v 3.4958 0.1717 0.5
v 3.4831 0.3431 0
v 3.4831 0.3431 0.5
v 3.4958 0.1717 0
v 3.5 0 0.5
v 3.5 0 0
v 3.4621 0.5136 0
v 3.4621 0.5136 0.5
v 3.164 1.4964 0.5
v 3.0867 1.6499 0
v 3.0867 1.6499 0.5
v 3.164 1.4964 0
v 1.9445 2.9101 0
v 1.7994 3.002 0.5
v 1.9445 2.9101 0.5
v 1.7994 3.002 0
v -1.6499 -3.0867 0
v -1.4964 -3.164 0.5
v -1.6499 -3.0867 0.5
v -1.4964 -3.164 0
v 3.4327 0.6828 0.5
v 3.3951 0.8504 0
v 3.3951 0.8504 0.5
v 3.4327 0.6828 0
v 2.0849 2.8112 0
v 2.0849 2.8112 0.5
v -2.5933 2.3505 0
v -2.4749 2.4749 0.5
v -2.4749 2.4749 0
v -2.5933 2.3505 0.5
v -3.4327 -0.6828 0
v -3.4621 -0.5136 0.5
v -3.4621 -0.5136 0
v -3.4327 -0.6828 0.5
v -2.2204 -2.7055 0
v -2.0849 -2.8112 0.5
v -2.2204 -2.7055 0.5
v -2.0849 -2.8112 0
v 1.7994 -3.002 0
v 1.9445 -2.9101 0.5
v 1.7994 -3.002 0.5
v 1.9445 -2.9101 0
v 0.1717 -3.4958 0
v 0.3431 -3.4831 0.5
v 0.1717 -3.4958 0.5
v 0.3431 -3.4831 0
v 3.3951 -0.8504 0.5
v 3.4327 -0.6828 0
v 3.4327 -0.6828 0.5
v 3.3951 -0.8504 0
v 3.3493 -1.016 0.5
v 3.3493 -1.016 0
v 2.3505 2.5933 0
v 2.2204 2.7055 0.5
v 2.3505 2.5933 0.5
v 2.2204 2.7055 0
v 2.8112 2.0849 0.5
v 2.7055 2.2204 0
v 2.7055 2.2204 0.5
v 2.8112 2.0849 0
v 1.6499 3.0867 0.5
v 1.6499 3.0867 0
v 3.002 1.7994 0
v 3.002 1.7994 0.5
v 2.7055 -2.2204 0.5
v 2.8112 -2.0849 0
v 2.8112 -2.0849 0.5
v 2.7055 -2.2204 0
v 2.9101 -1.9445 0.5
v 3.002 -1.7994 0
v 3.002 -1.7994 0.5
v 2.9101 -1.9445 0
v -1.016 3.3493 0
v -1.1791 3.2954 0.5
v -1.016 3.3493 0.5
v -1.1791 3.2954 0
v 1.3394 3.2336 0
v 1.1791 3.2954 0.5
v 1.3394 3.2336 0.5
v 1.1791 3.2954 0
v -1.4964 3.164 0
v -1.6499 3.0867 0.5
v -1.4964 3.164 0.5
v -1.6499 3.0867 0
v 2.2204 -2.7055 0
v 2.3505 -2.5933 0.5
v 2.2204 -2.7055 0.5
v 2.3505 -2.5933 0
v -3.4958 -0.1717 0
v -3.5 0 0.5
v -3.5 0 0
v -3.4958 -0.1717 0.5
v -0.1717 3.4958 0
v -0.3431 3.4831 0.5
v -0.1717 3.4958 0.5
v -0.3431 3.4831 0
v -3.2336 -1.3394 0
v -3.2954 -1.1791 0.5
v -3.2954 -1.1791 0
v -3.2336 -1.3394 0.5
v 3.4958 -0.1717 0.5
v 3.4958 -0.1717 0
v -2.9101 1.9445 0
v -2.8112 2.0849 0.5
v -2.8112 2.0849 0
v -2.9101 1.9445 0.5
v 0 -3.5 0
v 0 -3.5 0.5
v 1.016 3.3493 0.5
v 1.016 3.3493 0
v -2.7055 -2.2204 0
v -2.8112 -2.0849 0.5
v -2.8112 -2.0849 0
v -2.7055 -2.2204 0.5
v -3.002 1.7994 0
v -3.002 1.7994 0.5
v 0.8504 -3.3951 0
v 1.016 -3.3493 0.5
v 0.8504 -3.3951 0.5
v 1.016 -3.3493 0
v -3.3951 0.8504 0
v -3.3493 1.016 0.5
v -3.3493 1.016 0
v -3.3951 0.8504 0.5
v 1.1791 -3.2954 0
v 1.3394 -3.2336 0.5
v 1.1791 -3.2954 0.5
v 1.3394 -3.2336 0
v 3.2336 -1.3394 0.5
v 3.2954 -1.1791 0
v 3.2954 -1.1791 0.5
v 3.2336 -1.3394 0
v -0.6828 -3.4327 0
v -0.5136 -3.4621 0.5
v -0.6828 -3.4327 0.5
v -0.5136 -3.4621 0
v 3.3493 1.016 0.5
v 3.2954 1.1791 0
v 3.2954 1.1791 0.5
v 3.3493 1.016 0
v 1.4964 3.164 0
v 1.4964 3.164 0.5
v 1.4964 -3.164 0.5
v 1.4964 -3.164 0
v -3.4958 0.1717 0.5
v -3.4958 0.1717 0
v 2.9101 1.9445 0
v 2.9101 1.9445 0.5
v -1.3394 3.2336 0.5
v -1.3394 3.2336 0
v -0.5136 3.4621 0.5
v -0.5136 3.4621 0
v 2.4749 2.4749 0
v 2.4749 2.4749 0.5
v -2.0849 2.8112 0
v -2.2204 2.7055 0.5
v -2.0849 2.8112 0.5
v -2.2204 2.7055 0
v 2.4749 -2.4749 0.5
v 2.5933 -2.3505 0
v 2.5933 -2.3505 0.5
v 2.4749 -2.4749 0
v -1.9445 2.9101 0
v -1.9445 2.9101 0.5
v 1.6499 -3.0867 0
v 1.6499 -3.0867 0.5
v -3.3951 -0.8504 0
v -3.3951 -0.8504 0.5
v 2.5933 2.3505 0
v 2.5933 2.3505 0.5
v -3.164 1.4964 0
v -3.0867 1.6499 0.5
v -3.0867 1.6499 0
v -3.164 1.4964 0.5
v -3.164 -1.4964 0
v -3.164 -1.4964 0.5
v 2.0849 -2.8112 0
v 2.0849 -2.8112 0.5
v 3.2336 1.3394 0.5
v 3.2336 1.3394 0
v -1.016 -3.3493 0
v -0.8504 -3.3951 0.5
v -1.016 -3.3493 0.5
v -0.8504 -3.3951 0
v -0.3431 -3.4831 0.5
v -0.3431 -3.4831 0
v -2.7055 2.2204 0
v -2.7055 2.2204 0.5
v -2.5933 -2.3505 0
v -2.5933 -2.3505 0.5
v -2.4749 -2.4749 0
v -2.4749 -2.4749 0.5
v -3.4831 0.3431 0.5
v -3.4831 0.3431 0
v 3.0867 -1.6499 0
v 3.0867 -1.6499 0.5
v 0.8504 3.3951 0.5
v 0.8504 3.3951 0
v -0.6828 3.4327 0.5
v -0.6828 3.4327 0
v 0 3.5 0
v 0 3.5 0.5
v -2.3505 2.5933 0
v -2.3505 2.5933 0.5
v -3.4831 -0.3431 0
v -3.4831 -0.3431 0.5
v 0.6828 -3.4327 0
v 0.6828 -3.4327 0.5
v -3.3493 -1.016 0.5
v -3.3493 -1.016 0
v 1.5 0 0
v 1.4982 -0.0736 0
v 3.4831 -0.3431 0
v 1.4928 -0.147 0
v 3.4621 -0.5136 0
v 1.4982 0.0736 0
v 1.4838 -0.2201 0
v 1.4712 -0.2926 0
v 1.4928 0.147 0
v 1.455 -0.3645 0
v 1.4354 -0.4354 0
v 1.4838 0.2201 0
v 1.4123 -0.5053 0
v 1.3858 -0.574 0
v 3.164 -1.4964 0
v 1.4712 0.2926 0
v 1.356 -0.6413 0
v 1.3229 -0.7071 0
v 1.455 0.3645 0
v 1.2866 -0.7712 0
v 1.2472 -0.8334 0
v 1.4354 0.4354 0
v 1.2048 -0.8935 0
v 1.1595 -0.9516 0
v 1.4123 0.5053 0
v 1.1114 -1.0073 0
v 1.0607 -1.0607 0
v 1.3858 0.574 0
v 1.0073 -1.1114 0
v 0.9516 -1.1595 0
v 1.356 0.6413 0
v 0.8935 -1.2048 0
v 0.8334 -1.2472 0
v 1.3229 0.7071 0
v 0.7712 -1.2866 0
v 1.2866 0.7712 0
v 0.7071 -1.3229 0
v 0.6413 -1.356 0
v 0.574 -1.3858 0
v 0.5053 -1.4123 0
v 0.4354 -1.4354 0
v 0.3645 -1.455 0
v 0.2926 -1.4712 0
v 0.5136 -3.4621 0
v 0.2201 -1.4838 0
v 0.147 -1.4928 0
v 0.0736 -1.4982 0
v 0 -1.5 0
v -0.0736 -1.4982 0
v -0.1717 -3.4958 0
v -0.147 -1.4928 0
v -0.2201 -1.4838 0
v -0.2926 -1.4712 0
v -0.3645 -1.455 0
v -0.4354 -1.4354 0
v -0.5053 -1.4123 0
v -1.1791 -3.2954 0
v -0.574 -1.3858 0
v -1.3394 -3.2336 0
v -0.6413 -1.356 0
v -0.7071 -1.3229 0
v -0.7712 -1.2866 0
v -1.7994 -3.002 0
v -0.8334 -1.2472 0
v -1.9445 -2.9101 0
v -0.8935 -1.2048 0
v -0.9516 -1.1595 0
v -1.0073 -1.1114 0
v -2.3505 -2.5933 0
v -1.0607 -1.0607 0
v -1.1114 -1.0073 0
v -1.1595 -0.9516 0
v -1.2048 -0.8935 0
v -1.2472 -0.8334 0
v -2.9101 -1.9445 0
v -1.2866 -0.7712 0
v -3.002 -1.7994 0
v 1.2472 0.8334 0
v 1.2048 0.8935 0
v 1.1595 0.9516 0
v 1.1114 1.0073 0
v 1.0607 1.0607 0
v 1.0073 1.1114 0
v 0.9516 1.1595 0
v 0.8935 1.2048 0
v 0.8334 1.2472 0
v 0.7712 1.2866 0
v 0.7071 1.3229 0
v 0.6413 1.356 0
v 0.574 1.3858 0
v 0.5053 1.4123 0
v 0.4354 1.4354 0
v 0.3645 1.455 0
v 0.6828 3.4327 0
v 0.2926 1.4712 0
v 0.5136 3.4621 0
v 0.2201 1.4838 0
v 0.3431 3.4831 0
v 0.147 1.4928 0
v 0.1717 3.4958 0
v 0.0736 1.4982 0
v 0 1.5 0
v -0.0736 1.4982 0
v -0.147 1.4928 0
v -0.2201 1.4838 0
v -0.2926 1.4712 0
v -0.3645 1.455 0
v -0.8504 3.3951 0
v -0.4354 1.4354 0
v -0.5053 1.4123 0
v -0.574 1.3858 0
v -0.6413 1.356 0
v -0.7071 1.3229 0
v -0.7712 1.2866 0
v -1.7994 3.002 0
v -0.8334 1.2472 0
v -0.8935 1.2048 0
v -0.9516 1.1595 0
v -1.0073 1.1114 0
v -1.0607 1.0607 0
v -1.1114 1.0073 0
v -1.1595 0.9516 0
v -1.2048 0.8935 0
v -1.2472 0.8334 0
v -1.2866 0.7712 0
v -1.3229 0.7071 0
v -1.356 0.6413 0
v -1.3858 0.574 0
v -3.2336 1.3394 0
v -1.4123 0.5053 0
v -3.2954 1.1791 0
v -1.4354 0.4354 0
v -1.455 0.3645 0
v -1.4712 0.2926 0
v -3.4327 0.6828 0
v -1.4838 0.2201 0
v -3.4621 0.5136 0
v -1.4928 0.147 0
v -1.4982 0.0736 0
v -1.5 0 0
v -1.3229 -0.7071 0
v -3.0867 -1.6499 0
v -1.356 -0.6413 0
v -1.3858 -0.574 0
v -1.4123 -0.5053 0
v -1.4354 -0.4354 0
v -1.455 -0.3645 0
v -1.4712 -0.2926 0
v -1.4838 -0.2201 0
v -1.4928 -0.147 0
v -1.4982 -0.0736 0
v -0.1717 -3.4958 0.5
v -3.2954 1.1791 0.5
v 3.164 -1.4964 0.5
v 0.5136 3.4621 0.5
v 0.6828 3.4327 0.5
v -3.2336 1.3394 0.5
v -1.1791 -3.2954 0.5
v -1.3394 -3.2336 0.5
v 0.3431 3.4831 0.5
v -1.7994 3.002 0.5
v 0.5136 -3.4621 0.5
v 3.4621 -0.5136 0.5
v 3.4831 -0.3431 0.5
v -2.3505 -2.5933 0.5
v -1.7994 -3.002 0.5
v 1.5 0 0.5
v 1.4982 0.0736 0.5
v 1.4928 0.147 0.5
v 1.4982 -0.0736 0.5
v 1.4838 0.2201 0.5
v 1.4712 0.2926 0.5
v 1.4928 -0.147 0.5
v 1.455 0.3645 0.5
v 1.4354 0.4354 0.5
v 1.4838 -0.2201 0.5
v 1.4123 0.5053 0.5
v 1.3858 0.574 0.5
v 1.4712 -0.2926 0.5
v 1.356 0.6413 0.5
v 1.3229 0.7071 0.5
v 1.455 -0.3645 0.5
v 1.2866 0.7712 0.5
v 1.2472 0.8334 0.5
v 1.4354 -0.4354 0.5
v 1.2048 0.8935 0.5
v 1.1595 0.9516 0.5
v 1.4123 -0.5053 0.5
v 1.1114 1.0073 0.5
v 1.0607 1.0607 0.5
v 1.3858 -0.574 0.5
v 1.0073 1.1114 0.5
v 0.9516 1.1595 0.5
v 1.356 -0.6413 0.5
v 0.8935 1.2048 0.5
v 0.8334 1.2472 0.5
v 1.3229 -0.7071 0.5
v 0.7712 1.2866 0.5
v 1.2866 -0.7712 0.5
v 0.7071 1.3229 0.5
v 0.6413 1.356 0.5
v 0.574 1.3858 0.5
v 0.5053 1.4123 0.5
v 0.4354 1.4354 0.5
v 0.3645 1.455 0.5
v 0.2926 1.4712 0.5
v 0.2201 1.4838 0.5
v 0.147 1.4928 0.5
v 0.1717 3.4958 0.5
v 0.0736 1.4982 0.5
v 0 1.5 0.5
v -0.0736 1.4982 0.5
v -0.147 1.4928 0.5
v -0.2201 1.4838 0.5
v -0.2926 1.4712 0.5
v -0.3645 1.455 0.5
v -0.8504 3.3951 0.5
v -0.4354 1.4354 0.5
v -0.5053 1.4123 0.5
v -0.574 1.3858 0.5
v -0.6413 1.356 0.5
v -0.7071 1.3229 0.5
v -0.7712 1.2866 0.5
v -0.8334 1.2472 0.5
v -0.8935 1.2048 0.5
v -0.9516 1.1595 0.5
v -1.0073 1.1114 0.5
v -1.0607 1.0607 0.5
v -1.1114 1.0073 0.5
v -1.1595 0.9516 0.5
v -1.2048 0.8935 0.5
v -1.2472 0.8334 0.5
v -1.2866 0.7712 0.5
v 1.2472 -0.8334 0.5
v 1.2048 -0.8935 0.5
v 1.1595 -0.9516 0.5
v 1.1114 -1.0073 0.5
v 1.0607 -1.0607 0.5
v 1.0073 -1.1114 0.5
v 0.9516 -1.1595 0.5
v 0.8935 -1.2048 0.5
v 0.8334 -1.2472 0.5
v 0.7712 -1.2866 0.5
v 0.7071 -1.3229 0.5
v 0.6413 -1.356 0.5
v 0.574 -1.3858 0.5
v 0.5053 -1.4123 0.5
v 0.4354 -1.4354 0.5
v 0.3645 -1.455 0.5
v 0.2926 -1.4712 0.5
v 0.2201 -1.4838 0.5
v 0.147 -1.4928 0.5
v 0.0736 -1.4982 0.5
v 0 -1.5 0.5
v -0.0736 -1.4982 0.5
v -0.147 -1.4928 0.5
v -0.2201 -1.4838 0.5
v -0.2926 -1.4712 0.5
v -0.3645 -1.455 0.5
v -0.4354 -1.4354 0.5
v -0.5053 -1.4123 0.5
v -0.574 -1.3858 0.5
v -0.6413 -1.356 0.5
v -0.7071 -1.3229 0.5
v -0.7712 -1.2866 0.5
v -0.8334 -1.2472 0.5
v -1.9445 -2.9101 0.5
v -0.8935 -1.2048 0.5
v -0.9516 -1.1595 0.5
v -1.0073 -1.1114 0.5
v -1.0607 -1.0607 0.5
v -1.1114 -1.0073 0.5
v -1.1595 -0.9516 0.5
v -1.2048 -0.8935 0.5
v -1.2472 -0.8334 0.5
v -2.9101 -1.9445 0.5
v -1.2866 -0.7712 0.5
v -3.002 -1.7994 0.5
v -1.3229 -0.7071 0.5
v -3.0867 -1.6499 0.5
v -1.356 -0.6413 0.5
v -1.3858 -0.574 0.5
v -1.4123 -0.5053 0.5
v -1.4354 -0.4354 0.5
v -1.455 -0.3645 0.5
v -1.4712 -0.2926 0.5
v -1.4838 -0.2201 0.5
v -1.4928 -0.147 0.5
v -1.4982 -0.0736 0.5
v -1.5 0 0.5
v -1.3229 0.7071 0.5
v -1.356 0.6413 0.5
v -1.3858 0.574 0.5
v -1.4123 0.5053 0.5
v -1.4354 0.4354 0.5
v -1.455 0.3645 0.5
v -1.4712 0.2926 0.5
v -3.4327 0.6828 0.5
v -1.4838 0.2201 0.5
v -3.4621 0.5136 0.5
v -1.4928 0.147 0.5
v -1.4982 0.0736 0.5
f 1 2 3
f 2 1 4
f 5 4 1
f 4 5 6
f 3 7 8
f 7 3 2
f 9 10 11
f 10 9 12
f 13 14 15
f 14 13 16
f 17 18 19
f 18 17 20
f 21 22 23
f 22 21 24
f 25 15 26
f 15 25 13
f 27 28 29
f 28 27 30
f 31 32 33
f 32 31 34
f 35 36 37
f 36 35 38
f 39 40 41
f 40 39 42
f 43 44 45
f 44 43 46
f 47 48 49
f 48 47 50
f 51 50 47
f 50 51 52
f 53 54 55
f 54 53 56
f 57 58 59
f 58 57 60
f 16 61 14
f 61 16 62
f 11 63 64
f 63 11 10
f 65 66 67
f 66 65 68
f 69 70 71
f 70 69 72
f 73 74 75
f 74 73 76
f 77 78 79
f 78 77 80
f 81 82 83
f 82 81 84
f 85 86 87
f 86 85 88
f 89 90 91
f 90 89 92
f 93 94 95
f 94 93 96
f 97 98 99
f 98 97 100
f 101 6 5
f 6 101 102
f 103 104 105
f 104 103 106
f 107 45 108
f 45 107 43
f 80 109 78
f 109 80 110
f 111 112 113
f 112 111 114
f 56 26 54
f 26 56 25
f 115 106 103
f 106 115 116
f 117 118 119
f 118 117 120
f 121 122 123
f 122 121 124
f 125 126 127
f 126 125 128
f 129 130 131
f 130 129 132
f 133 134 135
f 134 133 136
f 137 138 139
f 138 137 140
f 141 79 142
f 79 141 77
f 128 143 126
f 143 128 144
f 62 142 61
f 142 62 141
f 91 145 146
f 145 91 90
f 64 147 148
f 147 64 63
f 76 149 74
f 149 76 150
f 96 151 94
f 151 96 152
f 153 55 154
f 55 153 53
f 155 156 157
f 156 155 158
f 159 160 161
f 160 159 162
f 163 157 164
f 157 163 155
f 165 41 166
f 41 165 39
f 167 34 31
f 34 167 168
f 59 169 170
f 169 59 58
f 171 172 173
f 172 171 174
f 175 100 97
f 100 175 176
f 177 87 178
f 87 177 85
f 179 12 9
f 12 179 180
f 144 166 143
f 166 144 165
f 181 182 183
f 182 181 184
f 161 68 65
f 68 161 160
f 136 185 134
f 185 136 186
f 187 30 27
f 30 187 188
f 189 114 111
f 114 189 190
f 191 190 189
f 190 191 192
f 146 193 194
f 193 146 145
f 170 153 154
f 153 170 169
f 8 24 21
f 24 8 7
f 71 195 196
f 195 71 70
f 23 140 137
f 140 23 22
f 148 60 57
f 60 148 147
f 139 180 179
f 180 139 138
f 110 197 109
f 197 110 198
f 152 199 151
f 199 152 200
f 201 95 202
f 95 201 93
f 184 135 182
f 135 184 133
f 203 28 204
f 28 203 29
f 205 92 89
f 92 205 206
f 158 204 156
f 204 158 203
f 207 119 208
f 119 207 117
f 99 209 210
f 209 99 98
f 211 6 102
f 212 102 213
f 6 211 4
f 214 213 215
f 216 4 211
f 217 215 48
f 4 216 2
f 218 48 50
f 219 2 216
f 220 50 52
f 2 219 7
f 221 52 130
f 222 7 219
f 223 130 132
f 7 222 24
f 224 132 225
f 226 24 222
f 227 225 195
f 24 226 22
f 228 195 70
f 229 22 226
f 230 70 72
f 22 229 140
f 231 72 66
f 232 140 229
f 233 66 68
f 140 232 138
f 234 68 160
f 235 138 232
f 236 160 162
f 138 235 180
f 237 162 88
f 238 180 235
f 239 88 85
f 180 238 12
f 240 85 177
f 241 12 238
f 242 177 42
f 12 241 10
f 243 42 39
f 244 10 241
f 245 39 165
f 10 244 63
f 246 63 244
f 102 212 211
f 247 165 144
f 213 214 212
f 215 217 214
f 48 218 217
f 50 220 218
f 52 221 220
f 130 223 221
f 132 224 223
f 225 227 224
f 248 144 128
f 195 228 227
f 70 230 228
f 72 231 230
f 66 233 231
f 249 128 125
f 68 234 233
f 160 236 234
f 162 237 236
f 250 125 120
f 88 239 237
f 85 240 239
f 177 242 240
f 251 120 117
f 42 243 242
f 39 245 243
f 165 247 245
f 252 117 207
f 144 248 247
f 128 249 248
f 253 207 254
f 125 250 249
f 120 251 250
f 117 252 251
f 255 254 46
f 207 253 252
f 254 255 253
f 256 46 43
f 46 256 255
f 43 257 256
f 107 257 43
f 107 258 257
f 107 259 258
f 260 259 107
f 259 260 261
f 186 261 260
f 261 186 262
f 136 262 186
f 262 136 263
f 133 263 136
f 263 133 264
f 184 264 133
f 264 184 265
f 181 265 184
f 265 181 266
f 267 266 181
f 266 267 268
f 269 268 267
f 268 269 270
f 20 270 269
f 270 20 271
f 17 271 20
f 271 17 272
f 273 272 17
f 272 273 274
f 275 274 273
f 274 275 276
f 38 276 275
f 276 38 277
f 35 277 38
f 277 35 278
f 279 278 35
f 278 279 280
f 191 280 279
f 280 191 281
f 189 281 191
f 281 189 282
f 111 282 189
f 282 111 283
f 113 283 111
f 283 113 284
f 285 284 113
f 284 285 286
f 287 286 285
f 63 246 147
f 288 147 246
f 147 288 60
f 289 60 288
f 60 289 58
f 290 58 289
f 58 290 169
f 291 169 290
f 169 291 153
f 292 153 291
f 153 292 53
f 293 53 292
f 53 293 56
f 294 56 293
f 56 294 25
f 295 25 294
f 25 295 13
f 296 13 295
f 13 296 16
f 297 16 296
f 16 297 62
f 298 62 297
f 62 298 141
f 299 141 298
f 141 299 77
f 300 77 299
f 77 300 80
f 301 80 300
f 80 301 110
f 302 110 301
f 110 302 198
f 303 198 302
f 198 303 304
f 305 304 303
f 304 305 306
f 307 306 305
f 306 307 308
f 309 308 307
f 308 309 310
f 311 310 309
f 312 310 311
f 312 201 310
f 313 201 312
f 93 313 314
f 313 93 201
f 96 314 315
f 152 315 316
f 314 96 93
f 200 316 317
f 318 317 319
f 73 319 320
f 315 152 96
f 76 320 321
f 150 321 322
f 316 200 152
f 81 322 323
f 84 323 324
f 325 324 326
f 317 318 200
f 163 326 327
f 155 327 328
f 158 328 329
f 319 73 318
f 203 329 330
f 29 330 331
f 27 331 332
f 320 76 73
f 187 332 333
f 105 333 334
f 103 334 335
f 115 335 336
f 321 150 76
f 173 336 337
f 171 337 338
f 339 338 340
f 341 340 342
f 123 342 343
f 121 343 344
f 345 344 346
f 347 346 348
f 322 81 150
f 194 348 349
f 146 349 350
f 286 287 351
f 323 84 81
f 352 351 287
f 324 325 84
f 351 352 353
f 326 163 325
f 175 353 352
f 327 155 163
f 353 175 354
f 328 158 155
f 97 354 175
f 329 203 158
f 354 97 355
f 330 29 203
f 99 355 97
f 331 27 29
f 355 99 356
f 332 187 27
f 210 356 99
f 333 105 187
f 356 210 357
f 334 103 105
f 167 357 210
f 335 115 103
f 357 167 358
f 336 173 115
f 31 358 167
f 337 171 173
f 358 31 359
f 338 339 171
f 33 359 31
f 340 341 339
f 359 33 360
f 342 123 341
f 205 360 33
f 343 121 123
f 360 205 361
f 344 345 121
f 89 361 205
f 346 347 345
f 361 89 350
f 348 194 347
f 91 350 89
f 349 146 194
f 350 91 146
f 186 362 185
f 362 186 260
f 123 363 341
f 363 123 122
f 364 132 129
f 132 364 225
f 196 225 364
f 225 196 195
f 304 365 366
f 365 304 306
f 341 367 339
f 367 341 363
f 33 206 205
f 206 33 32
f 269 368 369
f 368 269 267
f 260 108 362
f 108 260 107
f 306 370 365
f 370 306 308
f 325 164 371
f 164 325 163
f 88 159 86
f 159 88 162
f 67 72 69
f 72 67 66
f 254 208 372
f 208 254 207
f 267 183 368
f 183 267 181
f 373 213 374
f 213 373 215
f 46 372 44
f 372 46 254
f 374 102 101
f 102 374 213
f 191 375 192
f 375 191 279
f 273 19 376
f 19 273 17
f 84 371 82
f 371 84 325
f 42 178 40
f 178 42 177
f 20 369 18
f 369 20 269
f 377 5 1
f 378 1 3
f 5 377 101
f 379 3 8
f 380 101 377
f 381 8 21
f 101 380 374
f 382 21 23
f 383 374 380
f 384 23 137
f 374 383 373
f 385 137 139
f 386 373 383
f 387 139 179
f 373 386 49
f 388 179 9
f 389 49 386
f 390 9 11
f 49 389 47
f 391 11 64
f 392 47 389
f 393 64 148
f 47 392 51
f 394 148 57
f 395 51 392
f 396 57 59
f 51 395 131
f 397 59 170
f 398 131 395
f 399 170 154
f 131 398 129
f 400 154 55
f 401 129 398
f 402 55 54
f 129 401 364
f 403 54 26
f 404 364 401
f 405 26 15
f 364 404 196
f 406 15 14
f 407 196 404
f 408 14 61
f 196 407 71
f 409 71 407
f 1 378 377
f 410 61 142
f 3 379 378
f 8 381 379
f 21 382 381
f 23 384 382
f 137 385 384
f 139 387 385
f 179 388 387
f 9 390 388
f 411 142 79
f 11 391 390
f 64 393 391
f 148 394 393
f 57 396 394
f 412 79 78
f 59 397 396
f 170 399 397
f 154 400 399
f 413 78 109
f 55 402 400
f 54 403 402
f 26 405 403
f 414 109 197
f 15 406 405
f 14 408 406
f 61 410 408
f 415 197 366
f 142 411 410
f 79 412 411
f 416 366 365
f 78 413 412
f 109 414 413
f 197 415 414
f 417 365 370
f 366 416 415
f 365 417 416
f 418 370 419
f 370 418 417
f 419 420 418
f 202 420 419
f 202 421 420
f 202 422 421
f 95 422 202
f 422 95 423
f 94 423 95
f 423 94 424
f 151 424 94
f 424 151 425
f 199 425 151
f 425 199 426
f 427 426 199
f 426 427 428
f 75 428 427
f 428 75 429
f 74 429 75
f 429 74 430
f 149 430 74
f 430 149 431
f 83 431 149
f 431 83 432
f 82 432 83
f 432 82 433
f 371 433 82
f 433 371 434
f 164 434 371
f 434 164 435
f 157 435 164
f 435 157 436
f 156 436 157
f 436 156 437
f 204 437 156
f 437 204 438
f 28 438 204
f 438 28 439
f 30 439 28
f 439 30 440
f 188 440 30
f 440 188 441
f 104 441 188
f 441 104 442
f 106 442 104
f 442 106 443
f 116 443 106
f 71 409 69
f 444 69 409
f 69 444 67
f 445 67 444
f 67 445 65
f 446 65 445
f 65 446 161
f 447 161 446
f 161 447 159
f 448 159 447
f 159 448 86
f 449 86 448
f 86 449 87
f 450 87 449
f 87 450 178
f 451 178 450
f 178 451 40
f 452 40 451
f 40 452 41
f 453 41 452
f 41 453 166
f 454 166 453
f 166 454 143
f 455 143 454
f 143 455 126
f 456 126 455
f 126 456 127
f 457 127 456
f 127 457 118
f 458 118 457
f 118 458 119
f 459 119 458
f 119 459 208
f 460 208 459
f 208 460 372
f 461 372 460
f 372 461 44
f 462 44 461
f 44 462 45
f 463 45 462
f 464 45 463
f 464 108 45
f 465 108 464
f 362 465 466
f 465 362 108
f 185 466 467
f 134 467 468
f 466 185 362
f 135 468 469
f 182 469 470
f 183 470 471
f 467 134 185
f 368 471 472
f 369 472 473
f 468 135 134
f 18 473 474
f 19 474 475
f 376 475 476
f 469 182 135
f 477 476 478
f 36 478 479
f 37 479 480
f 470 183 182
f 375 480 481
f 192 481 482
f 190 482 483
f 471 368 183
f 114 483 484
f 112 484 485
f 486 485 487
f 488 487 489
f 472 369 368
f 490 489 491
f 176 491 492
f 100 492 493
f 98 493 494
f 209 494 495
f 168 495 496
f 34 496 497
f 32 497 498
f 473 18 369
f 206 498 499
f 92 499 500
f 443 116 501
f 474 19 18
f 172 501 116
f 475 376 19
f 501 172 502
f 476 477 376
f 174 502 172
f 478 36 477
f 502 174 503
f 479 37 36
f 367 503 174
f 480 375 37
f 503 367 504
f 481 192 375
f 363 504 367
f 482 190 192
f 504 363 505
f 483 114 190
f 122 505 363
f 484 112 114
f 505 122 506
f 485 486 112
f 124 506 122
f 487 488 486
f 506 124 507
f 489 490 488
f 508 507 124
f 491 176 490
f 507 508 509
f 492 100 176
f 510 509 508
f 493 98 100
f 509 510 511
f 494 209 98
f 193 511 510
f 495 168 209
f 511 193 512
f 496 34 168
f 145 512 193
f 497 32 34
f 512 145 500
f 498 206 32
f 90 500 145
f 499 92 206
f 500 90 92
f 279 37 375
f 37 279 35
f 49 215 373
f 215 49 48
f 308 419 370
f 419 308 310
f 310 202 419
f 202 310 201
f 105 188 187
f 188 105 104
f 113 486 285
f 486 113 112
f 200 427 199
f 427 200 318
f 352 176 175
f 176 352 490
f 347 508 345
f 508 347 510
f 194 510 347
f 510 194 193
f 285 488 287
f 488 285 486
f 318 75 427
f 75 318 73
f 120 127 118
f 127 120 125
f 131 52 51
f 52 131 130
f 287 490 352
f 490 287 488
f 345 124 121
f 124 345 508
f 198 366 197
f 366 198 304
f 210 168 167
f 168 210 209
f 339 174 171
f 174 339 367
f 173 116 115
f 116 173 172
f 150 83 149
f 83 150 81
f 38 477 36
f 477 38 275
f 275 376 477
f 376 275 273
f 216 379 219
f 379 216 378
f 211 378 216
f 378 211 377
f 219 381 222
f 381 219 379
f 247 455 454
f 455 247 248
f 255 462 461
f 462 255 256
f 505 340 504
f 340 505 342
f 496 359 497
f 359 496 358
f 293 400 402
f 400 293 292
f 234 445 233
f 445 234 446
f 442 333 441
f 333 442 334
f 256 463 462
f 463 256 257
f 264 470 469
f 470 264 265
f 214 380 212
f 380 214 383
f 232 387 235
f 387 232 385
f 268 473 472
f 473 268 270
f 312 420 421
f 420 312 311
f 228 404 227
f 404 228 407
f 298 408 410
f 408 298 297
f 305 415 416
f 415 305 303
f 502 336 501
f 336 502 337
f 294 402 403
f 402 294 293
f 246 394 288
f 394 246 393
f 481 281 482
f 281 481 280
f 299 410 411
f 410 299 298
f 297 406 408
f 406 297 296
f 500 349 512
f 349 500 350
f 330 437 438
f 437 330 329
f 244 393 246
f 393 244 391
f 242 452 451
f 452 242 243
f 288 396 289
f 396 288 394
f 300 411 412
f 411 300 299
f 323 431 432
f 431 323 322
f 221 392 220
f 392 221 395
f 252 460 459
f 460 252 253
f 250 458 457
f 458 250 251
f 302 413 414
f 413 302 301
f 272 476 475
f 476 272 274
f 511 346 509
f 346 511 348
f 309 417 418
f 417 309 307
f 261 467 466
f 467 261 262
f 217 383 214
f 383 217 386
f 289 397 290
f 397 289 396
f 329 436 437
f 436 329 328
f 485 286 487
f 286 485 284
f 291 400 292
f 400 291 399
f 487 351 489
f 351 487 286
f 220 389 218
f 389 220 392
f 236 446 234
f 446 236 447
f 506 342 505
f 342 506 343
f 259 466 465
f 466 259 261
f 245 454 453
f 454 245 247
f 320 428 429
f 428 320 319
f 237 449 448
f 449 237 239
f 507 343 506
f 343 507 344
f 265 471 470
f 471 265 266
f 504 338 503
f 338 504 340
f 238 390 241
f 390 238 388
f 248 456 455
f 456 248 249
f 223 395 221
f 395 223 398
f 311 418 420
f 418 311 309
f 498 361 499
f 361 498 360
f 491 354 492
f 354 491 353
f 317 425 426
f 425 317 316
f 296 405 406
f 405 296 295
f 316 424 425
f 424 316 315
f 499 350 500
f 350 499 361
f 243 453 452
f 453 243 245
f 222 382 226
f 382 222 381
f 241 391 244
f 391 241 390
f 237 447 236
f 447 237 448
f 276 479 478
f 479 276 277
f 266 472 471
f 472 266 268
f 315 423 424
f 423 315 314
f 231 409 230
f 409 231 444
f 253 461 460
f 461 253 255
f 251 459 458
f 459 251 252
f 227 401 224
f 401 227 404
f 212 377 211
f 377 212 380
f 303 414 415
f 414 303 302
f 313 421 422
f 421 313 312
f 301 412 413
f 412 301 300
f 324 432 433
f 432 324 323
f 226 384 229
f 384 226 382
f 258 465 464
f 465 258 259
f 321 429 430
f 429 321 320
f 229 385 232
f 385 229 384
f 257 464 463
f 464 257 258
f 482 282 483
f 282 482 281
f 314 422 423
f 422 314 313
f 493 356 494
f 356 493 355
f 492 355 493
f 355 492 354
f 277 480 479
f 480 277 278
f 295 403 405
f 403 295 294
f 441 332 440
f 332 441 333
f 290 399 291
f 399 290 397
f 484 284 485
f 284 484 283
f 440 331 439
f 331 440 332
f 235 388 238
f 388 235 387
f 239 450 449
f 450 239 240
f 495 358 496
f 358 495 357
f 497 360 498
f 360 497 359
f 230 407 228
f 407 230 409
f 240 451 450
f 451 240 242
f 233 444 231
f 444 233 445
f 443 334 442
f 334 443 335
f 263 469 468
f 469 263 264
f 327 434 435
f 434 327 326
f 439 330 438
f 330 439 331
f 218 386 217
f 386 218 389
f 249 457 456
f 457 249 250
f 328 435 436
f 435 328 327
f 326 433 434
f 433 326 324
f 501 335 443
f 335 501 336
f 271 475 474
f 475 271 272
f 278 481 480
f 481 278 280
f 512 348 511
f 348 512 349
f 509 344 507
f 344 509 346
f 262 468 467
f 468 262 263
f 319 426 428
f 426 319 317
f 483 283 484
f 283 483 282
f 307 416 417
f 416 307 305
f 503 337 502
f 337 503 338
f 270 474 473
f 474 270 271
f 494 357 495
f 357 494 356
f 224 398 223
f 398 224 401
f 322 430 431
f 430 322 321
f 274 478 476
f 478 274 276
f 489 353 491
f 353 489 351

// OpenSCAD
$fn = 128;

inner_d = 3.0;
outer_d = 7.0;
thickness = 0.5;

difference() {
  cylinder(d = outer_d, h = thickness);
  translate([0, 0, -0.1])
    cylinder(d = inner_d, h = thickness + 0.2);
}
